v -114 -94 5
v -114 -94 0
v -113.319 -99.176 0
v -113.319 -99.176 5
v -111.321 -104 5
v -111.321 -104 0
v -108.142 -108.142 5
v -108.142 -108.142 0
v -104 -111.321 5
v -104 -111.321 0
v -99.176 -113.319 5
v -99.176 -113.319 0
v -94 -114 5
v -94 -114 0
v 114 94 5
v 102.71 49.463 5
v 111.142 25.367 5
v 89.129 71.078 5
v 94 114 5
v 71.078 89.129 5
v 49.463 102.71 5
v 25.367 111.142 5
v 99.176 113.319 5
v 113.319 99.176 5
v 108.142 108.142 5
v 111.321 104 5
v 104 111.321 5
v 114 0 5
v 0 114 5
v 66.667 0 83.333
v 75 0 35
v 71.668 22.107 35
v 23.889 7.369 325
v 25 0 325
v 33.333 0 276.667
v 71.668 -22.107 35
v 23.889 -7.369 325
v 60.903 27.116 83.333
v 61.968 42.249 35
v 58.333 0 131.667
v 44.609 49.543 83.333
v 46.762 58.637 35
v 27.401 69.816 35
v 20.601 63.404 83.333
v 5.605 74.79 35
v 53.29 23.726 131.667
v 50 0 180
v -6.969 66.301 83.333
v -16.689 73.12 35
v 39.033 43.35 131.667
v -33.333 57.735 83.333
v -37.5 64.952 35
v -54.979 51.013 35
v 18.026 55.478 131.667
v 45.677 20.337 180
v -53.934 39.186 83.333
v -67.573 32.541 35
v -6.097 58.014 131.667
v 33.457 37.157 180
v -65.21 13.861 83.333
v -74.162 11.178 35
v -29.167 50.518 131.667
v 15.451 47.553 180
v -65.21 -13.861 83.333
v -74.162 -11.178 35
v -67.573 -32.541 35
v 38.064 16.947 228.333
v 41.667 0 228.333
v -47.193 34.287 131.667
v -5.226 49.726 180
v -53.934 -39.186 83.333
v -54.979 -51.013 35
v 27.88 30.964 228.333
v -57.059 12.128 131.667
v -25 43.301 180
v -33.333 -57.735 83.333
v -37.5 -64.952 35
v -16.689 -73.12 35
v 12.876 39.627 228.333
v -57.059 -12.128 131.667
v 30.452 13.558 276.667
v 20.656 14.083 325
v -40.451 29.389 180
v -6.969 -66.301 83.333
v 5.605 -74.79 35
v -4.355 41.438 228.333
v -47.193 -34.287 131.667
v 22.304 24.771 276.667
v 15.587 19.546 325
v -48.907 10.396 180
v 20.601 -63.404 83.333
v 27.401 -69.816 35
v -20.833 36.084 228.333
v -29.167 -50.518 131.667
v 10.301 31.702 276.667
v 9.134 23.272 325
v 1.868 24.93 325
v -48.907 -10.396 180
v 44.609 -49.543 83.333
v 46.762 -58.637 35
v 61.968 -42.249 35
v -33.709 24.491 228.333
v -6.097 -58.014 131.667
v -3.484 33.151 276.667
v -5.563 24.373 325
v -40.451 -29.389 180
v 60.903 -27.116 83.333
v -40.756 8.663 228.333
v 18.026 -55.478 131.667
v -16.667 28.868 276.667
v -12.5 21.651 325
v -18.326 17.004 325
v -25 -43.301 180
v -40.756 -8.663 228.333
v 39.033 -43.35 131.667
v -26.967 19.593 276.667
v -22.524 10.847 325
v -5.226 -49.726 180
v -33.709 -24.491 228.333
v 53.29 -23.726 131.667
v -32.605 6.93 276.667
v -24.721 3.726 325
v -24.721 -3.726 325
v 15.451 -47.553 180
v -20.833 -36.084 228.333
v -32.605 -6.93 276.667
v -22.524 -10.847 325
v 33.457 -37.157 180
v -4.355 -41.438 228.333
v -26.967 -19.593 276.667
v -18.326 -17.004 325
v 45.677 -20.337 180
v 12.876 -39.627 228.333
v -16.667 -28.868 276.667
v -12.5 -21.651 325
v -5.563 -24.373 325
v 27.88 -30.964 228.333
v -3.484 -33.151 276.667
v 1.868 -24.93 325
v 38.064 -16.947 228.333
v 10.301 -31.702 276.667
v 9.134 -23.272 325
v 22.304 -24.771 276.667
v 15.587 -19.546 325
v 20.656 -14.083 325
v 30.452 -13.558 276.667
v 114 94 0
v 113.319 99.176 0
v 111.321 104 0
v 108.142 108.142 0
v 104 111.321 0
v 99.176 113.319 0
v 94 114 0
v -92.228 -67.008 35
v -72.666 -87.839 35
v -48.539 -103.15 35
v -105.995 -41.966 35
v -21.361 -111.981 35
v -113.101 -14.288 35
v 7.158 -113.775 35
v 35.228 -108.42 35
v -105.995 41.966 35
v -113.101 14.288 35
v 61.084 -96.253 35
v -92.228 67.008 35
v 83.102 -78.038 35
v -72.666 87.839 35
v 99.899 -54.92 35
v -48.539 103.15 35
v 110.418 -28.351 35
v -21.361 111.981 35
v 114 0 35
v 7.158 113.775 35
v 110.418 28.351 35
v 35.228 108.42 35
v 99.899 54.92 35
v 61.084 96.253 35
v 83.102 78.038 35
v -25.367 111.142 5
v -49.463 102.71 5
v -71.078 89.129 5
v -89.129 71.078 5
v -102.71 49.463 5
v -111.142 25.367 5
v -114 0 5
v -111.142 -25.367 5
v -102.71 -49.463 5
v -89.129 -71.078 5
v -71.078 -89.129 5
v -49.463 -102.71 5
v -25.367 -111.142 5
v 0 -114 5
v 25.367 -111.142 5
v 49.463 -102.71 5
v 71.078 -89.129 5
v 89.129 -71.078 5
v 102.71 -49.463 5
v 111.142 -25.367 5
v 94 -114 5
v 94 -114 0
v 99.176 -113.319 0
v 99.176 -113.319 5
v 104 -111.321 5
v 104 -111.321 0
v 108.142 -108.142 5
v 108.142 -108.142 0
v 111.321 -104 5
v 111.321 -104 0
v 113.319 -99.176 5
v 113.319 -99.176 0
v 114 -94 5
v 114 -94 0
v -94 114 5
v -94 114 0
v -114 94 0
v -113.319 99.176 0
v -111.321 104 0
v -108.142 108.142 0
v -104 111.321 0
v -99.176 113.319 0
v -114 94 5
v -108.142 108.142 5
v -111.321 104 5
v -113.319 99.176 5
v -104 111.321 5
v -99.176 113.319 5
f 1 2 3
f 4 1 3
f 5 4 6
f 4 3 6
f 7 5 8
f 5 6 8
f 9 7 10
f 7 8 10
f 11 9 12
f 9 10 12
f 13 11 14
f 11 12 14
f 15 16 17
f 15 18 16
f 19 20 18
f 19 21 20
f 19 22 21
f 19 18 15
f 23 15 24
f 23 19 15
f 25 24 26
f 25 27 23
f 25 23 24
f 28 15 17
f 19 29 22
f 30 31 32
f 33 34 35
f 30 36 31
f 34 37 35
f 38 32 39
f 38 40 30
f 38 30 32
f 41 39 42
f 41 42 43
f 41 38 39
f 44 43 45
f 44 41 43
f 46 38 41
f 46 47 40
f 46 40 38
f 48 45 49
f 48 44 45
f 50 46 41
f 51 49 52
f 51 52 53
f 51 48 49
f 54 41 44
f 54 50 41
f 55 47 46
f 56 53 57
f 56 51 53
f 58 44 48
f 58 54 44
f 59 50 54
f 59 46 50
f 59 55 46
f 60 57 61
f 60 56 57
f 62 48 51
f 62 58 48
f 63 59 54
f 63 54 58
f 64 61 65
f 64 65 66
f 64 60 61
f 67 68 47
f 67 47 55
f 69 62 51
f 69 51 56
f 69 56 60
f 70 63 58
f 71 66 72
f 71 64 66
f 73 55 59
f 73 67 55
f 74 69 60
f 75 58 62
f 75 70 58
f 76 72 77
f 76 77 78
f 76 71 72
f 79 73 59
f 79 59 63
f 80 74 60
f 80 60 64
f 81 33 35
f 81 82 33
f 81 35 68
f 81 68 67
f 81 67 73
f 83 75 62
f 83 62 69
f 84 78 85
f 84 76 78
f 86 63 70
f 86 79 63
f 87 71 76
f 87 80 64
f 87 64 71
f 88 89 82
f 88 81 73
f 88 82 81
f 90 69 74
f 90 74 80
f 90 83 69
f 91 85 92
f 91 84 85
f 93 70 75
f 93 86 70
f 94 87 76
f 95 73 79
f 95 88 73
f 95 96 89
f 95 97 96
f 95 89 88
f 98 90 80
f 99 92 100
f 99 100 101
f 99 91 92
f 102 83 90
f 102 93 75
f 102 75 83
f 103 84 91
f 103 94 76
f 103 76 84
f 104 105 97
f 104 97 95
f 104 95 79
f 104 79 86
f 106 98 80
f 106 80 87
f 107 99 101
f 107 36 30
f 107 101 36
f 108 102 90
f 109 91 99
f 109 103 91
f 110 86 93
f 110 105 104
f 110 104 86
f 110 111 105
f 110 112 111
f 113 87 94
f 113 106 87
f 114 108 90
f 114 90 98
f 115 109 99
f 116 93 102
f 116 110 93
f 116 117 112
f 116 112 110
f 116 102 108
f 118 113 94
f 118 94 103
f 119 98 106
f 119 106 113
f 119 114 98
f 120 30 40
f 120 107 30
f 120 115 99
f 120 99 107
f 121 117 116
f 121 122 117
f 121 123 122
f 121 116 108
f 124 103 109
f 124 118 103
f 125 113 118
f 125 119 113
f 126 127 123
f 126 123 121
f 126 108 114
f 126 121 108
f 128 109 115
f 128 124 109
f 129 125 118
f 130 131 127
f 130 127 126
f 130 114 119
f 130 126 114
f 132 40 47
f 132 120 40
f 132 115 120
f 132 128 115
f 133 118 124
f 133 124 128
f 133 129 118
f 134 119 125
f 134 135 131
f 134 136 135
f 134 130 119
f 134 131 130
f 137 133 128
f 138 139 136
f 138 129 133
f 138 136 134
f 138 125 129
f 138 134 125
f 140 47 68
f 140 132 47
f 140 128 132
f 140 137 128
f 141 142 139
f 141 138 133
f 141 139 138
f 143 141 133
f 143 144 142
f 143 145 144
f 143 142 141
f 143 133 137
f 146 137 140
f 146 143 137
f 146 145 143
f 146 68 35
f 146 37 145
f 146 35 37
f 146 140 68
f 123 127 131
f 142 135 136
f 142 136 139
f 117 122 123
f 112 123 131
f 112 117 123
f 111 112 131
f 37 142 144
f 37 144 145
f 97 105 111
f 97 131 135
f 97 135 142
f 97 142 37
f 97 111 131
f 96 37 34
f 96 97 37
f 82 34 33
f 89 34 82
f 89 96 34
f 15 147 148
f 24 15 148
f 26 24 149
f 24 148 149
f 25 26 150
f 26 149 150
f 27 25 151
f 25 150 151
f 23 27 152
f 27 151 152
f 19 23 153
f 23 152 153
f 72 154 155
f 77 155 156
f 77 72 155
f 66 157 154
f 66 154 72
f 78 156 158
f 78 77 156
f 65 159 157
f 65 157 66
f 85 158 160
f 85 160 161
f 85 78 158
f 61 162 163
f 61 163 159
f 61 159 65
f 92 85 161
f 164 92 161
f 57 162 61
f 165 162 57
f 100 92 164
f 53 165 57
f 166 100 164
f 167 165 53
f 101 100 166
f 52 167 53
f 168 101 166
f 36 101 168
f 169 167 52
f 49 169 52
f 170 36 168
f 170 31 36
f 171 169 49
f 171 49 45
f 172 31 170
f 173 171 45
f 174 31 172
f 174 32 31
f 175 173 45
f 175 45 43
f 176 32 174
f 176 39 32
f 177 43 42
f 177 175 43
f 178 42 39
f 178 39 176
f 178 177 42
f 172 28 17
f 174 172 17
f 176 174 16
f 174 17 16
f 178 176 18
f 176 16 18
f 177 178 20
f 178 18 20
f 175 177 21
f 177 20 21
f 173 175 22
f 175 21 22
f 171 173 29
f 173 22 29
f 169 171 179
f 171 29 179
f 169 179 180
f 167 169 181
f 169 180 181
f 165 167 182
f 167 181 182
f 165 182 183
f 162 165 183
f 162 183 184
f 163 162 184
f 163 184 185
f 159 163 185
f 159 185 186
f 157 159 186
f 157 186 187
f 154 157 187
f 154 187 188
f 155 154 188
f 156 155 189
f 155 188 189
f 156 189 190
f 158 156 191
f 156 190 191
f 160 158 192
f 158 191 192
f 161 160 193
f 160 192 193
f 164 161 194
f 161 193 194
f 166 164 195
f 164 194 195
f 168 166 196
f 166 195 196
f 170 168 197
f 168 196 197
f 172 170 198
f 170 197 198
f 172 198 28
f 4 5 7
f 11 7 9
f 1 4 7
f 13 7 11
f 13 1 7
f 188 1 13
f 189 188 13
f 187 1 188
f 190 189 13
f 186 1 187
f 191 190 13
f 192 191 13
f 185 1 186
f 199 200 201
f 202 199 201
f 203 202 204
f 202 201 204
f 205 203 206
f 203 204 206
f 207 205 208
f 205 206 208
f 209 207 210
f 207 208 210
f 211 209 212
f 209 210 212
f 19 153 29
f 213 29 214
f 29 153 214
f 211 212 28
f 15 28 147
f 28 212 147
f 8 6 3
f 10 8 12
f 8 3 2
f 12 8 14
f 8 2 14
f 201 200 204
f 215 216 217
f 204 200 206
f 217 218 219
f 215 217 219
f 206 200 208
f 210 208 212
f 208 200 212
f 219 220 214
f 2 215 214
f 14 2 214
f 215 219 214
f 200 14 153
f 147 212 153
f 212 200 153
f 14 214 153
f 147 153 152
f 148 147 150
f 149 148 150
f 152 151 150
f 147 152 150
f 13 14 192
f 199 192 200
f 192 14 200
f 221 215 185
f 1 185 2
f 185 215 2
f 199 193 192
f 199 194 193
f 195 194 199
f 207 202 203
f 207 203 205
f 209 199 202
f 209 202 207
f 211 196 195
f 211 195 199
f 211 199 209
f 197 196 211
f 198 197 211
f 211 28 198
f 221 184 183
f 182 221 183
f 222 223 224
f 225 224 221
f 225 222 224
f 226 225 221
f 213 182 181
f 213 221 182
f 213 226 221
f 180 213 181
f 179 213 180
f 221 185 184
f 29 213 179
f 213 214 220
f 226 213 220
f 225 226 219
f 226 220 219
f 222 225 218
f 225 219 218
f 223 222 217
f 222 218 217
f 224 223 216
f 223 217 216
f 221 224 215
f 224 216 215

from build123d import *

# Parameters (mm, degrees)
PAD_DEPTH    = 5
SKETCH001_R  = 114
PAD001_DEPTH = 30
SKETCH002_R  = 75
SKETCH003_R  = 25


with BuildPart() as part:
    # Sketch → Pad (new body)
    with BuildSketch(Plane.XY):
        with BuildLine():
            Line((-94, -114), (94, -114))
            ThreePointArc((94, -114), (108.142136, -108.142136), (114, -94))
            Line((114, -94), (114, 94))
            ThreePointArc((114, 94), (108.142136, 108.142136), (94, 114))
            Line((94, 114), (-94, 114))
            ThreePointArc((-94, 114), (-108.142136, 108.142136), (-114, 94))
            Line((-114, 94), (-114, -94))
            ThreePointArc((-114, -94), (-108.142136, -108.142136), (-94, -114))
        make_face()
    extrude(amount=PAD_DEPTH)

    # Sketch001 (on Face10 of Pad) → Pad001 (join)
    with BuildSketch(Plane.XY.offset(5)):
        Circle(SKETCH001_R)
    extrude(amount=PAD001_DEPTH)

    # Sketch002 (on Face15 of Pad001) → AdditiveLoft section 0
    with BuildSketch(Plane.XY.offset(35)):
        Circle(SKETCH002_R)
    # Sketch003 (on DatumPlane) → AdditiveLoft section 1
    with BuildSketch(Plane.XY.offset(325)):
        Circle(SKETCH003_R)
    loft()


solid = part.part
